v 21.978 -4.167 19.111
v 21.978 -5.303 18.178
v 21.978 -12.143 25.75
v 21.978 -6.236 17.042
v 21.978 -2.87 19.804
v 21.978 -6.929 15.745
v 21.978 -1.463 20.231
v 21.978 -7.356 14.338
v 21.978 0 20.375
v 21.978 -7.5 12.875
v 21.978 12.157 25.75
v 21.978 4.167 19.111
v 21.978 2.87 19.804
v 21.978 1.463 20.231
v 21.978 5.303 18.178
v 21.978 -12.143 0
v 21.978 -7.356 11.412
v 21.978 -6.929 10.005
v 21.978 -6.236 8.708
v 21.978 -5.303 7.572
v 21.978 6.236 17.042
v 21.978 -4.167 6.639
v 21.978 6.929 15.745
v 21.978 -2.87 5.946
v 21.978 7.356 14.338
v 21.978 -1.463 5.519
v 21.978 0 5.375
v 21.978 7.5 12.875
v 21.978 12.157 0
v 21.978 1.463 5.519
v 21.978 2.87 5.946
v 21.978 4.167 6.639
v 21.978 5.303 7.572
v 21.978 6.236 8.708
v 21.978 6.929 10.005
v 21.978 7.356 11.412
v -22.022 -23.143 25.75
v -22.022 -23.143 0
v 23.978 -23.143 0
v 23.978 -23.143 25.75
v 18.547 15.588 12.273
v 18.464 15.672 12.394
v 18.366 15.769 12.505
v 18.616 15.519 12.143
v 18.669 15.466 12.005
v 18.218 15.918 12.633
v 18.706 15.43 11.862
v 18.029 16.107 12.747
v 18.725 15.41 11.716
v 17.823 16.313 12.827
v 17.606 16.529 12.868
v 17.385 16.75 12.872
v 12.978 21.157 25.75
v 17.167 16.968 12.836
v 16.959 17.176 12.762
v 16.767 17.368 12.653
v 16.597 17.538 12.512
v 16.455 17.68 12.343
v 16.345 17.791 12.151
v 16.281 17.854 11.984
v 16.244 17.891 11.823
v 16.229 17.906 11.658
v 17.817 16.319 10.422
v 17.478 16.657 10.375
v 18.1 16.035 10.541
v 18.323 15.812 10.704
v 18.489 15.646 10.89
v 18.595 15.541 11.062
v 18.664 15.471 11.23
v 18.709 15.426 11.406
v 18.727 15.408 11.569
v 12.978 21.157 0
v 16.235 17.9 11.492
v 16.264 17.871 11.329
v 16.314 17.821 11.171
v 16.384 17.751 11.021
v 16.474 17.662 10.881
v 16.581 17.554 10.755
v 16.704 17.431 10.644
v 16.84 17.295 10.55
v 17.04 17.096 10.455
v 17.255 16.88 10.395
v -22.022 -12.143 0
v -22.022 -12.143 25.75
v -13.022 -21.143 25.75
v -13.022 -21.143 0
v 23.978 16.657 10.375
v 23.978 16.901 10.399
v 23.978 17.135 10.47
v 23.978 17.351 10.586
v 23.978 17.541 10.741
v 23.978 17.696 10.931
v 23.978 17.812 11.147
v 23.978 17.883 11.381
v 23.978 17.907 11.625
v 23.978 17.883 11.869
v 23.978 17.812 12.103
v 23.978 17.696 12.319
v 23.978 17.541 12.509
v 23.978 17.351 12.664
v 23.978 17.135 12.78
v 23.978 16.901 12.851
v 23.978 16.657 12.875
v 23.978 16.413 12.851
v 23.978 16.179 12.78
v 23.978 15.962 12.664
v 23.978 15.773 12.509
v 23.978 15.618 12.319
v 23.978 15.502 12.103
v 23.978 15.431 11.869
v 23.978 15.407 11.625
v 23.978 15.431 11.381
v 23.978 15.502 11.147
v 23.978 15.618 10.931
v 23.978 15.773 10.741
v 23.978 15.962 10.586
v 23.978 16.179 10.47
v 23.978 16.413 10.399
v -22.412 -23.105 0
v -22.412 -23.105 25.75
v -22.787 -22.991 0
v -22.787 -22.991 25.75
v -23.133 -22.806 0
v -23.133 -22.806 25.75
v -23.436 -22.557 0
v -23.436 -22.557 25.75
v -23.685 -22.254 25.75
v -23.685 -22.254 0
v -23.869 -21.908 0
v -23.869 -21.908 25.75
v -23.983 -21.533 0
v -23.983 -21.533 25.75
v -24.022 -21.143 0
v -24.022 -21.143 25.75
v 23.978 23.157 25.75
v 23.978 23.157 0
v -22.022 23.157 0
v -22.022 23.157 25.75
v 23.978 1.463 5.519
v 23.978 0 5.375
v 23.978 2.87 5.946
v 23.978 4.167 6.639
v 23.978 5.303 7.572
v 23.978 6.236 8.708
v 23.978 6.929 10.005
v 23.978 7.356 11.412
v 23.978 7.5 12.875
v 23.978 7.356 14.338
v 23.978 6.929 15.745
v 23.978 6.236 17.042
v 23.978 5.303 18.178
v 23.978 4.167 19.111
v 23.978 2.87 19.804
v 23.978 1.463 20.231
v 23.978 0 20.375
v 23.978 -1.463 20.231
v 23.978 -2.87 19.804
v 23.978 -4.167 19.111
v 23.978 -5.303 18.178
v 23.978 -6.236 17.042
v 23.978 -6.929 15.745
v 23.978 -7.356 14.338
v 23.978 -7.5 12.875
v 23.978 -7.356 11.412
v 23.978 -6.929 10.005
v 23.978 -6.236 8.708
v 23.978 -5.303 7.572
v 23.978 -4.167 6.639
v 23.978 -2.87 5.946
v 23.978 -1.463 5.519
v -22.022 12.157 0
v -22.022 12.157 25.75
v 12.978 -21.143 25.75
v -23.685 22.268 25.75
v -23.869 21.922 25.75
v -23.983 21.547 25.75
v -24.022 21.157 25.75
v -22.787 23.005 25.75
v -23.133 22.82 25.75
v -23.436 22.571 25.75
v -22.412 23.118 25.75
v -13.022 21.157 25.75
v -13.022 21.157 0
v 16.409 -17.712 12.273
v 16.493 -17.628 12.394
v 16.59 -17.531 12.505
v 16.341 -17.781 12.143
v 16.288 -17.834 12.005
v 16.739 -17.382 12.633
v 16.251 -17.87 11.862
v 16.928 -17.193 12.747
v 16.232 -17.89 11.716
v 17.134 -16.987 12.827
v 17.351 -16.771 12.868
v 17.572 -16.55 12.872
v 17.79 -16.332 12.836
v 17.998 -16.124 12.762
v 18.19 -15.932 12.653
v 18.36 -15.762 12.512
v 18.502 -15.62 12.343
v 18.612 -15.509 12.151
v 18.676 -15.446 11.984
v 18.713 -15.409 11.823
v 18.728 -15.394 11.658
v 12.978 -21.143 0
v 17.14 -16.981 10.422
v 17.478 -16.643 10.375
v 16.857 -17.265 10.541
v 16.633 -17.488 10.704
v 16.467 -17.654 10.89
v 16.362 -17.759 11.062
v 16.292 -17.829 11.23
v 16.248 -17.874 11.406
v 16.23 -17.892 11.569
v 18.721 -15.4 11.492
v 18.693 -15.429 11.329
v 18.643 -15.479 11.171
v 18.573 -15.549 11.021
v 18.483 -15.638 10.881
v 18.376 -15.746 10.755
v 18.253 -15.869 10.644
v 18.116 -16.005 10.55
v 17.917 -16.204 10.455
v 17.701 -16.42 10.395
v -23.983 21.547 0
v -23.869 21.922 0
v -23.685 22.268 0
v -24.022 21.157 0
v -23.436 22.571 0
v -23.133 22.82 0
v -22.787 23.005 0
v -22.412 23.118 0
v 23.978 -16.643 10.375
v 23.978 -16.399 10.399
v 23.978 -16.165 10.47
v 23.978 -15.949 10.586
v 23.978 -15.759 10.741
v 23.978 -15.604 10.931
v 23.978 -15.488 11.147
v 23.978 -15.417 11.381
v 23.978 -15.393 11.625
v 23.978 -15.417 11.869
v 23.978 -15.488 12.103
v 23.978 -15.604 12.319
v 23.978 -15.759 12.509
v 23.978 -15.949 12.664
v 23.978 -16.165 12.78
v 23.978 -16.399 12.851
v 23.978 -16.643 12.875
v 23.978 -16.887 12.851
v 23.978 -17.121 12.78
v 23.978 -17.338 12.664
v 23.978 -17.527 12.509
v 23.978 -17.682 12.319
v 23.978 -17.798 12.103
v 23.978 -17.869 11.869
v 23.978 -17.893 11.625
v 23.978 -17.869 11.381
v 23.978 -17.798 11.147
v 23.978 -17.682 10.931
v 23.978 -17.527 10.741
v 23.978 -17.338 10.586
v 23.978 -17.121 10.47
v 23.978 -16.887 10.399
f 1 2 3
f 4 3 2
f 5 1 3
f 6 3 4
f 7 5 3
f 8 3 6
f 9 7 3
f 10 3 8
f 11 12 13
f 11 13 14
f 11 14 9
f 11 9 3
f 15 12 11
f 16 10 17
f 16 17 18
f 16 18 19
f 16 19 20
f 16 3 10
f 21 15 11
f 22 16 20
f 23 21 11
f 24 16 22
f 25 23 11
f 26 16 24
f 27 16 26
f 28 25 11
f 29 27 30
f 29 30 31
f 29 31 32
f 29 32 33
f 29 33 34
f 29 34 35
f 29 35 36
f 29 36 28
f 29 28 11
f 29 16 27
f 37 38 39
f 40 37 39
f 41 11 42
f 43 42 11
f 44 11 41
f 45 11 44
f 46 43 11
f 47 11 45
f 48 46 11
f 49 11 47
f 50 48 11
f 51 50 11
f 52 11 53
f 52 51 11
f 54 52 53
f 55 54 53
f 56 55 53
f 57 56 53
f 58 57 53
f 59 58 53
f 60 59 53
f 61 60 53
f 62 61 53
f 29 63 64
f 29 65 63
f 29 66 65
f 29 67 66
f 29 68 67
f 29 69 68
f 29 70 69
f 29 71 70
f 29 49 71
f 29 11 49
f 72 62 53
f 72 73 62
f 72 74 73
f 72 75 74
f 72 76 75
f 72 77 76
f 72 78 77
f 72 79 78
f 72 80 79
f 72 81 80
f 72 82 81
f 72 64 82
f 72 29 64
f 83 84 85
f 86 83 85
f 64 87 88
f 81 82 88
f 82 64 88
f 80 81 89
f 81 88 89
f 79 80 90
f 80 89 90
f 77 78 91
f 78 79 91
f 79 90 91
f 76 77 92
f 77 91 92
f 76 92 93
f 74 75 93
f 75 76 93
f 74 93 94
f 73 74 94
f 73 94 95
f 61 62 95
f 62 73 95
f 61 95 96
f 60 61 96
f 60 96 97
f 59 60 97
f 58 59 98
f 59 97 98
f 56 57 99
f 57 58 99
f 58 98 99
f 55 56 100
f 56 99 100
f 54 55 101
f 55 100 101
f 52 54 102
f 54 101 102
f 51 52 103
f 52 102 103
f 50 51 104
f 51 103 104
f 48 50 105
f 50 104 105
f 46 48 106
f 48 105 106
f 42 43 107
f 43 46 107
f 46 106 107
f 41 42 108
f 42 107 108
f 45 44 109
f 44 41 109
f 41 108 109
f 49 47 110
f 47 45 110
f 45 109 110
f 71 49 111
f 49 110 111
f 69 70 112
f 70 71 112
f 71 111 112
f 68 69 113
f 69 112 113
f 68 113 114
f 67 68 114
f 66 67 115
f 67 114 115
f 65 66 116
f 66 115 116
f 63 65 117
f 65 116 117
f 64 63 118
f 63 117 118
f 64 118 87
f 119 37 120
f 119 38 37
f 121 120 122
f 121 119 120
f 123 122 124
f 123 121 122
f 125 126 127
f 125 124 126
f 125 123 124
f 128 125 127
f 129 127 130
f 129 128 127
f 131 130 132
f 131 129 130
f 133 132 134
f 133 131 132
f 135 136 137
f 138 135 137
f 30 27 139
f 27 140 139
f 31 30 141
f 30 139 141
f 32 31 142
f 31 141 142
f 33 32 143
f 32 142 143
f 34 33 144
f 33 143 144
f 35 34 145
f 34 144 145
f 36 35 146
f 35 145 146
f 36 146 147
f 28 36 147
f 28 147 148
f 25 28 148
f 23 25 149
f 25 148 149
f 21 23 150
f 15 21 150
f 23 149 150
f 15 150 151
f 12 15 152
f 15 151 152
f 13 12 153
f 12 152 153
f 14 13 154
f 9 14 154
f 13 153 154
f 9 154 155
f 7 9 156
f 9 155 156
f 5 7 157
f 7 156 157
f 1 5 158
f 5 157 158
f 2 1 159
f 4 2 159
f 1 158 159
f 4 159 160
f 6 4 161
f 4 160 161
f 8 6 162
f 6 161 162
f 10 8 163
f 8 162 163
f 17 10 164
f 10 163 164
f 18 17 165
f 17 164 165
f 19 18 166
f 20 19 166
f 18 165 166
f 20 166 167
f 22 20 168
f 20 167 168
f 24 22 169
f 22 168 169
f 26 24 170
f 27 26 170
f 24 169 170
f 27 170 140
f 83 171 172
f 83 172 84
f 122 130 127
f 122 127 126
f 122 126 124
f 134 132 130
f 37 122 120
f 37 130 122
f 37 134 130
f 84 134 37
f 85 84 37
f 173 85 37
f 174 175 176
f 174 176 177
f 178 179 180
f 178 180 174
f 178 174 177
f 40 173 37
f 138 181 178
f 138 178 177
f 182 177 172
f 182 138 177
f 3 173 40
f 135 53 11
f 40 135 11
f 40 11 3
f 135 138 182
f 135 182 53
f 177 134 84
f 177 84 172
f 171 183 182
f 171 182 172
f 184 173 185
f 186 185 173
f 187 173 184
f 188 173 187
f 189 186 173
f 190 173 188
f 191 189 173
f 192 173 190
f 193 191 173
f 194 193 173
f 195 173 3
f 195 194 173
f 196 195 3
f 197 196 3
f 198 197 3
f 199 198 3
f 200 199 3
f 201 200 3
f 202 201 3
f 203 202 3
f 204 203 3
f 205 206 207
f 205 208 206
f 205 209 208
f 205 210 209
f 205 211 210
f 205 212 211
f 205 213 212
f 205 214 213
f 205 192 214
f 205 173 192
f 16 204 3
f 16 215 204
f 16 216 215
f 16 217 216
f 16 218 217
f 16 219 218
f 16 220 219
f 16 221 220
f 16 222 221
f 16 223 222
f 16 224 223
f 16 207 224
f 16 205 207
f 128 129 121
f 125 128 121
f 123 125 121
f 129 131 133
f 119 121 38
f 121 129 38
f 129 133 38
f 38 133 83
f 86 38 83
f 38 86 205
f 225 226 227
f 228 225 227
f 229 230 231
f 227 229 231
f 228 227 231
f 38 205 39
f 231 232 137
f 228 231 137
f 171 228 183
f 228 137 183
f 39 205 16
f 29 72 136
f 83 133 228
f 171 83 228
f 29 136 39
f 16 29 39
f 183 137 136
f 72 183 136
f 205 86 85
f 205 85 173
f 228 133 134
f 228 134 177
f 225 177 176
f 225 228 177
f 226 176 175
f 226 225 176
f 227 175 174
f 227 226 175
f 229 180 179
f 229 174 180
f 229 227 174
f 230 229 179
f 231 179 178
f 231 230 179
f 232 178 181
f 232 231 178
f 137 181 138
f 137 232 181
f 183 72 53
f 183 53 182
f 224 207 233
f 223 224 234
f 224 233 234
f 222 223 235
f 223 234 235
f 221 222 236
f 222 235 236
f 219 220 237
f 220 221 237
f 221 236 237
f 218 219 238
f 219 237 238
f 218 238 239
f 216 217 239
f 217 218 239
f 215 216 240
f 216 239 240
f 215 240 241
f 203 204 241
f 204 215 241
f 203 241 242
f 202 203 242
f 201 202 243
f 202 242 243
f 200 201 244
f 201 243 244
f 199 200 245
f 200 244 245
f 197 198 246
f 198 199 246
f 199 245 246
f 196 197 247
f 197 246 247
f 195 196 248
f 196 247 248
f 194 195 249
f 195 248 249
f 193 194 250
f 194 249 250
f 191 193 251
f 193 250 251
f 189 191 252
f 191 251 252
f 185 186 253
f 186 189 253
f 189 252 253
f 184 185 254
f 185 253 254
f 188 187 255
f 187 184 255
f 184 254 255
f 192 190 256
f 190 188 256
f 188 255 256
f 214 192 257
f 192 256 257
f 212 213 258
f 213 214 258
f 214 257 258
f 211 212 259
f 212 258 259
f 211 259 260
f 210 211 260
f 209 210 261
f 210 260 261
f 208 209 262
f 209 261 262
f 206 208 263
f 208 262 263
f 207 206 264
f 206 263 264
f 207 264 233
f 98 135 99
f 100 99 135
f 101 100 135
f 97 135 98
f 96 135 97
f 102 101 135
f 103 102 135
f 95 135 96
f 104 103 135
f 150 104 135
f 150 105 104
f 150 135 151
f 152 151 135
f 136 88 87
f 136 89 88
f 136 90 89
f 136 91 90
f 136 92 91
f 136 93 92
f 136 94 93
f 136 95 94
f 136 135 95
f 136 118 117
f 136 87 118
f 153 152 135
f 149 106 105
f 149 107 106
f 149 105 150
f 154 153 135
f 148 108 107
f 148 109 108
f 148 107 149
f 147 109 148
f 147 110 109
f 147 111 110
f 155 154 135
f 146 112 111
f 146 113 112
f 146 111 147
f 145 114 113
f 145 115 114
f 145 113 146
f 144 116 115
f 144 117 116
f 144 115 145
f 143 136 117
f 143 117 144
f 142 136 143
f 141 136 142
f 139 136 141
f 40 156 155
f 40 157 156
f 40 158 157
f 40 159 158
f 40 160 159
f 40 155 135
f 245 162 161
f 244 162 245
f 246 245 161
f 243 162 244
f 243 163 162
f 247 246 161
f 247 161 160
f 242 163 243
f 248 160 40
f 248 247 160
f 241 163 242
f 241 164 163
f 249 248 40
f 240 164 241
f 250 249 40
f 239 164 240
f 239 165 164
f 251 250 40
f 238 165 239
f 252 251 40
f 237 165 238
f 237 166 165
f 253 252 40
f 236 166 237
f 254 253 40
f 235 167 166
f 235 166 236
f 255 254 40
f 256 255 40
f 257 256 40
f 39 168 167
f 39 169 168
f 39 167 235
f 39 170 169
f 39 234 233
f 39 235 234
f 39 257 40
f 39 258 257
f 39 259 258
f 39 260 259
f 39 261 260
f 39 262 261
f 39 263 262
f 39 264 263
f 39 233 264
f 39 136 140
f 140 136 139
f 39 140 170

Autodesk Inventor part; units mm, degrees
ref_plane "YZ Plane" through (0, 0, 0) normal (1, 0, 0) x (0, 1, 0)
ref_plane "XZ Plane" through (0, 0, 0) normal (0, 1, 0) x (-1, 0, 0)
ref_plane "Work Plane1" through (0, 0, 0) normal (0, 0, 1) x (1, 0, 0)
sketch "Sketch3" plane through (0, 0, 0) normal (0, 0, 1) x (1, 0, 0)
  line L0 (-22.0216, 21.1569) -> (-22.0216, -21.1431) projected
  line L1 (-0.0216, 21.1569) -> (-22.0216, 21.1569) projected
  line L2 (-0.0216, 23.1569) -> (-0.0216, 21.1569) projected
  line L3 (-0.0216, 23.1569) -> (-22.0216, 23.1569) projected
  arc A0 (-22.0216, 23.1569) -> (-24.0216, 21.1569) centre (-22.0216, 21.1569) ccw projected
  line L4 (-24.0216, -21.1431) -> (-24.0216, 21.1569) projected
  arc A1 (-24.0216, -21.1431) -> (-22.0216, -23.1431) centre (-22.0216, -21.1431) ccw projected
  line L5 (-22.0216, -23.1431) -> (-0.0216, -23.1431) projected
  line L6 (-0.0216, -21.1431) -> (-0.0216, -23.1431) projected
  line L7 (-22.0216, -21.1431) -> (-0.0216, -21.1431) projected
  line L8 (0.2784, 23.1569) -> (0.2784, 21.1569) projected
  line L9 (12.9784, 21.1569) -> (0.2784, 21.1569) projected
  line L10 (21.9784, 12.1569) -> (12.9784, 21.1569) projected
  line L11 (21.9784, -12.1431) -> (21.9784, 12.1569) projected
  line L12 (12.9784, -21.1431) -> (21.9784, -12.1431) projected
  line L13 (0.2784, -21.1431) -> (12.9784, -21.1431) projected
  line L14 (0.2784, -21.1431) -> (0.2784, -23.1431) projected
  line L15 (23.9784, -23.1431) -> (0.2784, -23.1431) projected
  line L16 (23.9784, 23.1569) -> (23.9784, -23.1431) projected
  line L17 (0.2784, 23.1569) -> (23.9784, 23.1569) projected
  line L18 (0.2784, 21.1569) -> (-0.0216, 21.1569)
  line L19 (-0.0216, 21.1569) -> (-0.0216, 23.1569)
  line L20 (-0.0216, 23.1569) -> (0.2784, 23.1569)
  line L21 (0.2784, 23.1569) -> (0.2784, 21.1569)
  line L22 (-0.0216, -21.1431) -> (0.2784, -21.1431)
  line L23 (0.2784, -21.1431) -> (0.2784, -23.1431)
  line L24 (0.2784, -23.1431) -> (-0.0216, -23.1431)
  line L25 (-0.0216, -23.1431) -> (-0.0216, -21.1431)
  point P0 (0, 0)
extrude "Extrusion2" add sketch "Sketch3" along normal blind 25.75 contours L0 L7 L6 L5 A1 L4 A0 L3 L2 L1 | L2 L20 L8 L18 | L22 L14 L24 L6 | L8 L17 L16 L15 L14 L13 L12 L11 L10 L9
sketch "Sketch5" plane through (23.9784, -23.1431, 0) normal (1, 0, 0) x (0, 0, -1)
  circle A0 centre (-12.875, 23.1431) radius 7.5
  point P0 (0, 23.1431)
  dimension "d4" = 15
extrude "Extrusion3" cut sketch "Sketch5" against normal up to surface (2 mm away)
sketch "Sketch7" plane through (0, 0, 25.75) normal (0, 0, 1) x (1, 0, 0)
  line L0 (-22.0216, -21.1431) -> (12.9784, -21.1431) projected
  line L1 (-22.0216, 21.1569) -> (-22.0216, -21.1431) projected
  line L2 (-22.0216, -12.1431) -> (-22.0216, -21.1431) projected
  line L3 (-22.0216, -12.1431) -> (-13.0216, -21.1431) projected
  line L4 (-22.0216, -21.1431) -> (-13.0216, -21.1431) projected
  line L5 (-13.0216, 21.1569) -> (-22.0216, 21.1569) projected
  line L6 (-13.0216, 21.1569) -> (-22.0216, 12.1569) projected
  line L7 (-22.0216, 21.1569) -> (-22.0216, 12.1569) projected
  point P0 (0, 0)
ref_plane "Work Plane2" through (-24.0216, -23.1431, 0) normal (0, 0, 1) x (1, 0, 0)
extrude "Extrusion5" add sketch "Sketch7" against normal up to surface (25.75 mm away)
sketch "Sketch8" plane through (23.9784, -23.1431, 0) normal (1, 0, 0) x (0, 0, -1)
  circle A0 centre (-11.625, 39.8) radius 1.25 projected
  circle A1 centre (-11.625, 6.5) radius 1.25 projected
  point P0 (0, 23.1431)
extrude "Extrusion6" cut sketch "Sketch8" against normal blind 25.75
properties part number "MotorHousingBottom_split3"
